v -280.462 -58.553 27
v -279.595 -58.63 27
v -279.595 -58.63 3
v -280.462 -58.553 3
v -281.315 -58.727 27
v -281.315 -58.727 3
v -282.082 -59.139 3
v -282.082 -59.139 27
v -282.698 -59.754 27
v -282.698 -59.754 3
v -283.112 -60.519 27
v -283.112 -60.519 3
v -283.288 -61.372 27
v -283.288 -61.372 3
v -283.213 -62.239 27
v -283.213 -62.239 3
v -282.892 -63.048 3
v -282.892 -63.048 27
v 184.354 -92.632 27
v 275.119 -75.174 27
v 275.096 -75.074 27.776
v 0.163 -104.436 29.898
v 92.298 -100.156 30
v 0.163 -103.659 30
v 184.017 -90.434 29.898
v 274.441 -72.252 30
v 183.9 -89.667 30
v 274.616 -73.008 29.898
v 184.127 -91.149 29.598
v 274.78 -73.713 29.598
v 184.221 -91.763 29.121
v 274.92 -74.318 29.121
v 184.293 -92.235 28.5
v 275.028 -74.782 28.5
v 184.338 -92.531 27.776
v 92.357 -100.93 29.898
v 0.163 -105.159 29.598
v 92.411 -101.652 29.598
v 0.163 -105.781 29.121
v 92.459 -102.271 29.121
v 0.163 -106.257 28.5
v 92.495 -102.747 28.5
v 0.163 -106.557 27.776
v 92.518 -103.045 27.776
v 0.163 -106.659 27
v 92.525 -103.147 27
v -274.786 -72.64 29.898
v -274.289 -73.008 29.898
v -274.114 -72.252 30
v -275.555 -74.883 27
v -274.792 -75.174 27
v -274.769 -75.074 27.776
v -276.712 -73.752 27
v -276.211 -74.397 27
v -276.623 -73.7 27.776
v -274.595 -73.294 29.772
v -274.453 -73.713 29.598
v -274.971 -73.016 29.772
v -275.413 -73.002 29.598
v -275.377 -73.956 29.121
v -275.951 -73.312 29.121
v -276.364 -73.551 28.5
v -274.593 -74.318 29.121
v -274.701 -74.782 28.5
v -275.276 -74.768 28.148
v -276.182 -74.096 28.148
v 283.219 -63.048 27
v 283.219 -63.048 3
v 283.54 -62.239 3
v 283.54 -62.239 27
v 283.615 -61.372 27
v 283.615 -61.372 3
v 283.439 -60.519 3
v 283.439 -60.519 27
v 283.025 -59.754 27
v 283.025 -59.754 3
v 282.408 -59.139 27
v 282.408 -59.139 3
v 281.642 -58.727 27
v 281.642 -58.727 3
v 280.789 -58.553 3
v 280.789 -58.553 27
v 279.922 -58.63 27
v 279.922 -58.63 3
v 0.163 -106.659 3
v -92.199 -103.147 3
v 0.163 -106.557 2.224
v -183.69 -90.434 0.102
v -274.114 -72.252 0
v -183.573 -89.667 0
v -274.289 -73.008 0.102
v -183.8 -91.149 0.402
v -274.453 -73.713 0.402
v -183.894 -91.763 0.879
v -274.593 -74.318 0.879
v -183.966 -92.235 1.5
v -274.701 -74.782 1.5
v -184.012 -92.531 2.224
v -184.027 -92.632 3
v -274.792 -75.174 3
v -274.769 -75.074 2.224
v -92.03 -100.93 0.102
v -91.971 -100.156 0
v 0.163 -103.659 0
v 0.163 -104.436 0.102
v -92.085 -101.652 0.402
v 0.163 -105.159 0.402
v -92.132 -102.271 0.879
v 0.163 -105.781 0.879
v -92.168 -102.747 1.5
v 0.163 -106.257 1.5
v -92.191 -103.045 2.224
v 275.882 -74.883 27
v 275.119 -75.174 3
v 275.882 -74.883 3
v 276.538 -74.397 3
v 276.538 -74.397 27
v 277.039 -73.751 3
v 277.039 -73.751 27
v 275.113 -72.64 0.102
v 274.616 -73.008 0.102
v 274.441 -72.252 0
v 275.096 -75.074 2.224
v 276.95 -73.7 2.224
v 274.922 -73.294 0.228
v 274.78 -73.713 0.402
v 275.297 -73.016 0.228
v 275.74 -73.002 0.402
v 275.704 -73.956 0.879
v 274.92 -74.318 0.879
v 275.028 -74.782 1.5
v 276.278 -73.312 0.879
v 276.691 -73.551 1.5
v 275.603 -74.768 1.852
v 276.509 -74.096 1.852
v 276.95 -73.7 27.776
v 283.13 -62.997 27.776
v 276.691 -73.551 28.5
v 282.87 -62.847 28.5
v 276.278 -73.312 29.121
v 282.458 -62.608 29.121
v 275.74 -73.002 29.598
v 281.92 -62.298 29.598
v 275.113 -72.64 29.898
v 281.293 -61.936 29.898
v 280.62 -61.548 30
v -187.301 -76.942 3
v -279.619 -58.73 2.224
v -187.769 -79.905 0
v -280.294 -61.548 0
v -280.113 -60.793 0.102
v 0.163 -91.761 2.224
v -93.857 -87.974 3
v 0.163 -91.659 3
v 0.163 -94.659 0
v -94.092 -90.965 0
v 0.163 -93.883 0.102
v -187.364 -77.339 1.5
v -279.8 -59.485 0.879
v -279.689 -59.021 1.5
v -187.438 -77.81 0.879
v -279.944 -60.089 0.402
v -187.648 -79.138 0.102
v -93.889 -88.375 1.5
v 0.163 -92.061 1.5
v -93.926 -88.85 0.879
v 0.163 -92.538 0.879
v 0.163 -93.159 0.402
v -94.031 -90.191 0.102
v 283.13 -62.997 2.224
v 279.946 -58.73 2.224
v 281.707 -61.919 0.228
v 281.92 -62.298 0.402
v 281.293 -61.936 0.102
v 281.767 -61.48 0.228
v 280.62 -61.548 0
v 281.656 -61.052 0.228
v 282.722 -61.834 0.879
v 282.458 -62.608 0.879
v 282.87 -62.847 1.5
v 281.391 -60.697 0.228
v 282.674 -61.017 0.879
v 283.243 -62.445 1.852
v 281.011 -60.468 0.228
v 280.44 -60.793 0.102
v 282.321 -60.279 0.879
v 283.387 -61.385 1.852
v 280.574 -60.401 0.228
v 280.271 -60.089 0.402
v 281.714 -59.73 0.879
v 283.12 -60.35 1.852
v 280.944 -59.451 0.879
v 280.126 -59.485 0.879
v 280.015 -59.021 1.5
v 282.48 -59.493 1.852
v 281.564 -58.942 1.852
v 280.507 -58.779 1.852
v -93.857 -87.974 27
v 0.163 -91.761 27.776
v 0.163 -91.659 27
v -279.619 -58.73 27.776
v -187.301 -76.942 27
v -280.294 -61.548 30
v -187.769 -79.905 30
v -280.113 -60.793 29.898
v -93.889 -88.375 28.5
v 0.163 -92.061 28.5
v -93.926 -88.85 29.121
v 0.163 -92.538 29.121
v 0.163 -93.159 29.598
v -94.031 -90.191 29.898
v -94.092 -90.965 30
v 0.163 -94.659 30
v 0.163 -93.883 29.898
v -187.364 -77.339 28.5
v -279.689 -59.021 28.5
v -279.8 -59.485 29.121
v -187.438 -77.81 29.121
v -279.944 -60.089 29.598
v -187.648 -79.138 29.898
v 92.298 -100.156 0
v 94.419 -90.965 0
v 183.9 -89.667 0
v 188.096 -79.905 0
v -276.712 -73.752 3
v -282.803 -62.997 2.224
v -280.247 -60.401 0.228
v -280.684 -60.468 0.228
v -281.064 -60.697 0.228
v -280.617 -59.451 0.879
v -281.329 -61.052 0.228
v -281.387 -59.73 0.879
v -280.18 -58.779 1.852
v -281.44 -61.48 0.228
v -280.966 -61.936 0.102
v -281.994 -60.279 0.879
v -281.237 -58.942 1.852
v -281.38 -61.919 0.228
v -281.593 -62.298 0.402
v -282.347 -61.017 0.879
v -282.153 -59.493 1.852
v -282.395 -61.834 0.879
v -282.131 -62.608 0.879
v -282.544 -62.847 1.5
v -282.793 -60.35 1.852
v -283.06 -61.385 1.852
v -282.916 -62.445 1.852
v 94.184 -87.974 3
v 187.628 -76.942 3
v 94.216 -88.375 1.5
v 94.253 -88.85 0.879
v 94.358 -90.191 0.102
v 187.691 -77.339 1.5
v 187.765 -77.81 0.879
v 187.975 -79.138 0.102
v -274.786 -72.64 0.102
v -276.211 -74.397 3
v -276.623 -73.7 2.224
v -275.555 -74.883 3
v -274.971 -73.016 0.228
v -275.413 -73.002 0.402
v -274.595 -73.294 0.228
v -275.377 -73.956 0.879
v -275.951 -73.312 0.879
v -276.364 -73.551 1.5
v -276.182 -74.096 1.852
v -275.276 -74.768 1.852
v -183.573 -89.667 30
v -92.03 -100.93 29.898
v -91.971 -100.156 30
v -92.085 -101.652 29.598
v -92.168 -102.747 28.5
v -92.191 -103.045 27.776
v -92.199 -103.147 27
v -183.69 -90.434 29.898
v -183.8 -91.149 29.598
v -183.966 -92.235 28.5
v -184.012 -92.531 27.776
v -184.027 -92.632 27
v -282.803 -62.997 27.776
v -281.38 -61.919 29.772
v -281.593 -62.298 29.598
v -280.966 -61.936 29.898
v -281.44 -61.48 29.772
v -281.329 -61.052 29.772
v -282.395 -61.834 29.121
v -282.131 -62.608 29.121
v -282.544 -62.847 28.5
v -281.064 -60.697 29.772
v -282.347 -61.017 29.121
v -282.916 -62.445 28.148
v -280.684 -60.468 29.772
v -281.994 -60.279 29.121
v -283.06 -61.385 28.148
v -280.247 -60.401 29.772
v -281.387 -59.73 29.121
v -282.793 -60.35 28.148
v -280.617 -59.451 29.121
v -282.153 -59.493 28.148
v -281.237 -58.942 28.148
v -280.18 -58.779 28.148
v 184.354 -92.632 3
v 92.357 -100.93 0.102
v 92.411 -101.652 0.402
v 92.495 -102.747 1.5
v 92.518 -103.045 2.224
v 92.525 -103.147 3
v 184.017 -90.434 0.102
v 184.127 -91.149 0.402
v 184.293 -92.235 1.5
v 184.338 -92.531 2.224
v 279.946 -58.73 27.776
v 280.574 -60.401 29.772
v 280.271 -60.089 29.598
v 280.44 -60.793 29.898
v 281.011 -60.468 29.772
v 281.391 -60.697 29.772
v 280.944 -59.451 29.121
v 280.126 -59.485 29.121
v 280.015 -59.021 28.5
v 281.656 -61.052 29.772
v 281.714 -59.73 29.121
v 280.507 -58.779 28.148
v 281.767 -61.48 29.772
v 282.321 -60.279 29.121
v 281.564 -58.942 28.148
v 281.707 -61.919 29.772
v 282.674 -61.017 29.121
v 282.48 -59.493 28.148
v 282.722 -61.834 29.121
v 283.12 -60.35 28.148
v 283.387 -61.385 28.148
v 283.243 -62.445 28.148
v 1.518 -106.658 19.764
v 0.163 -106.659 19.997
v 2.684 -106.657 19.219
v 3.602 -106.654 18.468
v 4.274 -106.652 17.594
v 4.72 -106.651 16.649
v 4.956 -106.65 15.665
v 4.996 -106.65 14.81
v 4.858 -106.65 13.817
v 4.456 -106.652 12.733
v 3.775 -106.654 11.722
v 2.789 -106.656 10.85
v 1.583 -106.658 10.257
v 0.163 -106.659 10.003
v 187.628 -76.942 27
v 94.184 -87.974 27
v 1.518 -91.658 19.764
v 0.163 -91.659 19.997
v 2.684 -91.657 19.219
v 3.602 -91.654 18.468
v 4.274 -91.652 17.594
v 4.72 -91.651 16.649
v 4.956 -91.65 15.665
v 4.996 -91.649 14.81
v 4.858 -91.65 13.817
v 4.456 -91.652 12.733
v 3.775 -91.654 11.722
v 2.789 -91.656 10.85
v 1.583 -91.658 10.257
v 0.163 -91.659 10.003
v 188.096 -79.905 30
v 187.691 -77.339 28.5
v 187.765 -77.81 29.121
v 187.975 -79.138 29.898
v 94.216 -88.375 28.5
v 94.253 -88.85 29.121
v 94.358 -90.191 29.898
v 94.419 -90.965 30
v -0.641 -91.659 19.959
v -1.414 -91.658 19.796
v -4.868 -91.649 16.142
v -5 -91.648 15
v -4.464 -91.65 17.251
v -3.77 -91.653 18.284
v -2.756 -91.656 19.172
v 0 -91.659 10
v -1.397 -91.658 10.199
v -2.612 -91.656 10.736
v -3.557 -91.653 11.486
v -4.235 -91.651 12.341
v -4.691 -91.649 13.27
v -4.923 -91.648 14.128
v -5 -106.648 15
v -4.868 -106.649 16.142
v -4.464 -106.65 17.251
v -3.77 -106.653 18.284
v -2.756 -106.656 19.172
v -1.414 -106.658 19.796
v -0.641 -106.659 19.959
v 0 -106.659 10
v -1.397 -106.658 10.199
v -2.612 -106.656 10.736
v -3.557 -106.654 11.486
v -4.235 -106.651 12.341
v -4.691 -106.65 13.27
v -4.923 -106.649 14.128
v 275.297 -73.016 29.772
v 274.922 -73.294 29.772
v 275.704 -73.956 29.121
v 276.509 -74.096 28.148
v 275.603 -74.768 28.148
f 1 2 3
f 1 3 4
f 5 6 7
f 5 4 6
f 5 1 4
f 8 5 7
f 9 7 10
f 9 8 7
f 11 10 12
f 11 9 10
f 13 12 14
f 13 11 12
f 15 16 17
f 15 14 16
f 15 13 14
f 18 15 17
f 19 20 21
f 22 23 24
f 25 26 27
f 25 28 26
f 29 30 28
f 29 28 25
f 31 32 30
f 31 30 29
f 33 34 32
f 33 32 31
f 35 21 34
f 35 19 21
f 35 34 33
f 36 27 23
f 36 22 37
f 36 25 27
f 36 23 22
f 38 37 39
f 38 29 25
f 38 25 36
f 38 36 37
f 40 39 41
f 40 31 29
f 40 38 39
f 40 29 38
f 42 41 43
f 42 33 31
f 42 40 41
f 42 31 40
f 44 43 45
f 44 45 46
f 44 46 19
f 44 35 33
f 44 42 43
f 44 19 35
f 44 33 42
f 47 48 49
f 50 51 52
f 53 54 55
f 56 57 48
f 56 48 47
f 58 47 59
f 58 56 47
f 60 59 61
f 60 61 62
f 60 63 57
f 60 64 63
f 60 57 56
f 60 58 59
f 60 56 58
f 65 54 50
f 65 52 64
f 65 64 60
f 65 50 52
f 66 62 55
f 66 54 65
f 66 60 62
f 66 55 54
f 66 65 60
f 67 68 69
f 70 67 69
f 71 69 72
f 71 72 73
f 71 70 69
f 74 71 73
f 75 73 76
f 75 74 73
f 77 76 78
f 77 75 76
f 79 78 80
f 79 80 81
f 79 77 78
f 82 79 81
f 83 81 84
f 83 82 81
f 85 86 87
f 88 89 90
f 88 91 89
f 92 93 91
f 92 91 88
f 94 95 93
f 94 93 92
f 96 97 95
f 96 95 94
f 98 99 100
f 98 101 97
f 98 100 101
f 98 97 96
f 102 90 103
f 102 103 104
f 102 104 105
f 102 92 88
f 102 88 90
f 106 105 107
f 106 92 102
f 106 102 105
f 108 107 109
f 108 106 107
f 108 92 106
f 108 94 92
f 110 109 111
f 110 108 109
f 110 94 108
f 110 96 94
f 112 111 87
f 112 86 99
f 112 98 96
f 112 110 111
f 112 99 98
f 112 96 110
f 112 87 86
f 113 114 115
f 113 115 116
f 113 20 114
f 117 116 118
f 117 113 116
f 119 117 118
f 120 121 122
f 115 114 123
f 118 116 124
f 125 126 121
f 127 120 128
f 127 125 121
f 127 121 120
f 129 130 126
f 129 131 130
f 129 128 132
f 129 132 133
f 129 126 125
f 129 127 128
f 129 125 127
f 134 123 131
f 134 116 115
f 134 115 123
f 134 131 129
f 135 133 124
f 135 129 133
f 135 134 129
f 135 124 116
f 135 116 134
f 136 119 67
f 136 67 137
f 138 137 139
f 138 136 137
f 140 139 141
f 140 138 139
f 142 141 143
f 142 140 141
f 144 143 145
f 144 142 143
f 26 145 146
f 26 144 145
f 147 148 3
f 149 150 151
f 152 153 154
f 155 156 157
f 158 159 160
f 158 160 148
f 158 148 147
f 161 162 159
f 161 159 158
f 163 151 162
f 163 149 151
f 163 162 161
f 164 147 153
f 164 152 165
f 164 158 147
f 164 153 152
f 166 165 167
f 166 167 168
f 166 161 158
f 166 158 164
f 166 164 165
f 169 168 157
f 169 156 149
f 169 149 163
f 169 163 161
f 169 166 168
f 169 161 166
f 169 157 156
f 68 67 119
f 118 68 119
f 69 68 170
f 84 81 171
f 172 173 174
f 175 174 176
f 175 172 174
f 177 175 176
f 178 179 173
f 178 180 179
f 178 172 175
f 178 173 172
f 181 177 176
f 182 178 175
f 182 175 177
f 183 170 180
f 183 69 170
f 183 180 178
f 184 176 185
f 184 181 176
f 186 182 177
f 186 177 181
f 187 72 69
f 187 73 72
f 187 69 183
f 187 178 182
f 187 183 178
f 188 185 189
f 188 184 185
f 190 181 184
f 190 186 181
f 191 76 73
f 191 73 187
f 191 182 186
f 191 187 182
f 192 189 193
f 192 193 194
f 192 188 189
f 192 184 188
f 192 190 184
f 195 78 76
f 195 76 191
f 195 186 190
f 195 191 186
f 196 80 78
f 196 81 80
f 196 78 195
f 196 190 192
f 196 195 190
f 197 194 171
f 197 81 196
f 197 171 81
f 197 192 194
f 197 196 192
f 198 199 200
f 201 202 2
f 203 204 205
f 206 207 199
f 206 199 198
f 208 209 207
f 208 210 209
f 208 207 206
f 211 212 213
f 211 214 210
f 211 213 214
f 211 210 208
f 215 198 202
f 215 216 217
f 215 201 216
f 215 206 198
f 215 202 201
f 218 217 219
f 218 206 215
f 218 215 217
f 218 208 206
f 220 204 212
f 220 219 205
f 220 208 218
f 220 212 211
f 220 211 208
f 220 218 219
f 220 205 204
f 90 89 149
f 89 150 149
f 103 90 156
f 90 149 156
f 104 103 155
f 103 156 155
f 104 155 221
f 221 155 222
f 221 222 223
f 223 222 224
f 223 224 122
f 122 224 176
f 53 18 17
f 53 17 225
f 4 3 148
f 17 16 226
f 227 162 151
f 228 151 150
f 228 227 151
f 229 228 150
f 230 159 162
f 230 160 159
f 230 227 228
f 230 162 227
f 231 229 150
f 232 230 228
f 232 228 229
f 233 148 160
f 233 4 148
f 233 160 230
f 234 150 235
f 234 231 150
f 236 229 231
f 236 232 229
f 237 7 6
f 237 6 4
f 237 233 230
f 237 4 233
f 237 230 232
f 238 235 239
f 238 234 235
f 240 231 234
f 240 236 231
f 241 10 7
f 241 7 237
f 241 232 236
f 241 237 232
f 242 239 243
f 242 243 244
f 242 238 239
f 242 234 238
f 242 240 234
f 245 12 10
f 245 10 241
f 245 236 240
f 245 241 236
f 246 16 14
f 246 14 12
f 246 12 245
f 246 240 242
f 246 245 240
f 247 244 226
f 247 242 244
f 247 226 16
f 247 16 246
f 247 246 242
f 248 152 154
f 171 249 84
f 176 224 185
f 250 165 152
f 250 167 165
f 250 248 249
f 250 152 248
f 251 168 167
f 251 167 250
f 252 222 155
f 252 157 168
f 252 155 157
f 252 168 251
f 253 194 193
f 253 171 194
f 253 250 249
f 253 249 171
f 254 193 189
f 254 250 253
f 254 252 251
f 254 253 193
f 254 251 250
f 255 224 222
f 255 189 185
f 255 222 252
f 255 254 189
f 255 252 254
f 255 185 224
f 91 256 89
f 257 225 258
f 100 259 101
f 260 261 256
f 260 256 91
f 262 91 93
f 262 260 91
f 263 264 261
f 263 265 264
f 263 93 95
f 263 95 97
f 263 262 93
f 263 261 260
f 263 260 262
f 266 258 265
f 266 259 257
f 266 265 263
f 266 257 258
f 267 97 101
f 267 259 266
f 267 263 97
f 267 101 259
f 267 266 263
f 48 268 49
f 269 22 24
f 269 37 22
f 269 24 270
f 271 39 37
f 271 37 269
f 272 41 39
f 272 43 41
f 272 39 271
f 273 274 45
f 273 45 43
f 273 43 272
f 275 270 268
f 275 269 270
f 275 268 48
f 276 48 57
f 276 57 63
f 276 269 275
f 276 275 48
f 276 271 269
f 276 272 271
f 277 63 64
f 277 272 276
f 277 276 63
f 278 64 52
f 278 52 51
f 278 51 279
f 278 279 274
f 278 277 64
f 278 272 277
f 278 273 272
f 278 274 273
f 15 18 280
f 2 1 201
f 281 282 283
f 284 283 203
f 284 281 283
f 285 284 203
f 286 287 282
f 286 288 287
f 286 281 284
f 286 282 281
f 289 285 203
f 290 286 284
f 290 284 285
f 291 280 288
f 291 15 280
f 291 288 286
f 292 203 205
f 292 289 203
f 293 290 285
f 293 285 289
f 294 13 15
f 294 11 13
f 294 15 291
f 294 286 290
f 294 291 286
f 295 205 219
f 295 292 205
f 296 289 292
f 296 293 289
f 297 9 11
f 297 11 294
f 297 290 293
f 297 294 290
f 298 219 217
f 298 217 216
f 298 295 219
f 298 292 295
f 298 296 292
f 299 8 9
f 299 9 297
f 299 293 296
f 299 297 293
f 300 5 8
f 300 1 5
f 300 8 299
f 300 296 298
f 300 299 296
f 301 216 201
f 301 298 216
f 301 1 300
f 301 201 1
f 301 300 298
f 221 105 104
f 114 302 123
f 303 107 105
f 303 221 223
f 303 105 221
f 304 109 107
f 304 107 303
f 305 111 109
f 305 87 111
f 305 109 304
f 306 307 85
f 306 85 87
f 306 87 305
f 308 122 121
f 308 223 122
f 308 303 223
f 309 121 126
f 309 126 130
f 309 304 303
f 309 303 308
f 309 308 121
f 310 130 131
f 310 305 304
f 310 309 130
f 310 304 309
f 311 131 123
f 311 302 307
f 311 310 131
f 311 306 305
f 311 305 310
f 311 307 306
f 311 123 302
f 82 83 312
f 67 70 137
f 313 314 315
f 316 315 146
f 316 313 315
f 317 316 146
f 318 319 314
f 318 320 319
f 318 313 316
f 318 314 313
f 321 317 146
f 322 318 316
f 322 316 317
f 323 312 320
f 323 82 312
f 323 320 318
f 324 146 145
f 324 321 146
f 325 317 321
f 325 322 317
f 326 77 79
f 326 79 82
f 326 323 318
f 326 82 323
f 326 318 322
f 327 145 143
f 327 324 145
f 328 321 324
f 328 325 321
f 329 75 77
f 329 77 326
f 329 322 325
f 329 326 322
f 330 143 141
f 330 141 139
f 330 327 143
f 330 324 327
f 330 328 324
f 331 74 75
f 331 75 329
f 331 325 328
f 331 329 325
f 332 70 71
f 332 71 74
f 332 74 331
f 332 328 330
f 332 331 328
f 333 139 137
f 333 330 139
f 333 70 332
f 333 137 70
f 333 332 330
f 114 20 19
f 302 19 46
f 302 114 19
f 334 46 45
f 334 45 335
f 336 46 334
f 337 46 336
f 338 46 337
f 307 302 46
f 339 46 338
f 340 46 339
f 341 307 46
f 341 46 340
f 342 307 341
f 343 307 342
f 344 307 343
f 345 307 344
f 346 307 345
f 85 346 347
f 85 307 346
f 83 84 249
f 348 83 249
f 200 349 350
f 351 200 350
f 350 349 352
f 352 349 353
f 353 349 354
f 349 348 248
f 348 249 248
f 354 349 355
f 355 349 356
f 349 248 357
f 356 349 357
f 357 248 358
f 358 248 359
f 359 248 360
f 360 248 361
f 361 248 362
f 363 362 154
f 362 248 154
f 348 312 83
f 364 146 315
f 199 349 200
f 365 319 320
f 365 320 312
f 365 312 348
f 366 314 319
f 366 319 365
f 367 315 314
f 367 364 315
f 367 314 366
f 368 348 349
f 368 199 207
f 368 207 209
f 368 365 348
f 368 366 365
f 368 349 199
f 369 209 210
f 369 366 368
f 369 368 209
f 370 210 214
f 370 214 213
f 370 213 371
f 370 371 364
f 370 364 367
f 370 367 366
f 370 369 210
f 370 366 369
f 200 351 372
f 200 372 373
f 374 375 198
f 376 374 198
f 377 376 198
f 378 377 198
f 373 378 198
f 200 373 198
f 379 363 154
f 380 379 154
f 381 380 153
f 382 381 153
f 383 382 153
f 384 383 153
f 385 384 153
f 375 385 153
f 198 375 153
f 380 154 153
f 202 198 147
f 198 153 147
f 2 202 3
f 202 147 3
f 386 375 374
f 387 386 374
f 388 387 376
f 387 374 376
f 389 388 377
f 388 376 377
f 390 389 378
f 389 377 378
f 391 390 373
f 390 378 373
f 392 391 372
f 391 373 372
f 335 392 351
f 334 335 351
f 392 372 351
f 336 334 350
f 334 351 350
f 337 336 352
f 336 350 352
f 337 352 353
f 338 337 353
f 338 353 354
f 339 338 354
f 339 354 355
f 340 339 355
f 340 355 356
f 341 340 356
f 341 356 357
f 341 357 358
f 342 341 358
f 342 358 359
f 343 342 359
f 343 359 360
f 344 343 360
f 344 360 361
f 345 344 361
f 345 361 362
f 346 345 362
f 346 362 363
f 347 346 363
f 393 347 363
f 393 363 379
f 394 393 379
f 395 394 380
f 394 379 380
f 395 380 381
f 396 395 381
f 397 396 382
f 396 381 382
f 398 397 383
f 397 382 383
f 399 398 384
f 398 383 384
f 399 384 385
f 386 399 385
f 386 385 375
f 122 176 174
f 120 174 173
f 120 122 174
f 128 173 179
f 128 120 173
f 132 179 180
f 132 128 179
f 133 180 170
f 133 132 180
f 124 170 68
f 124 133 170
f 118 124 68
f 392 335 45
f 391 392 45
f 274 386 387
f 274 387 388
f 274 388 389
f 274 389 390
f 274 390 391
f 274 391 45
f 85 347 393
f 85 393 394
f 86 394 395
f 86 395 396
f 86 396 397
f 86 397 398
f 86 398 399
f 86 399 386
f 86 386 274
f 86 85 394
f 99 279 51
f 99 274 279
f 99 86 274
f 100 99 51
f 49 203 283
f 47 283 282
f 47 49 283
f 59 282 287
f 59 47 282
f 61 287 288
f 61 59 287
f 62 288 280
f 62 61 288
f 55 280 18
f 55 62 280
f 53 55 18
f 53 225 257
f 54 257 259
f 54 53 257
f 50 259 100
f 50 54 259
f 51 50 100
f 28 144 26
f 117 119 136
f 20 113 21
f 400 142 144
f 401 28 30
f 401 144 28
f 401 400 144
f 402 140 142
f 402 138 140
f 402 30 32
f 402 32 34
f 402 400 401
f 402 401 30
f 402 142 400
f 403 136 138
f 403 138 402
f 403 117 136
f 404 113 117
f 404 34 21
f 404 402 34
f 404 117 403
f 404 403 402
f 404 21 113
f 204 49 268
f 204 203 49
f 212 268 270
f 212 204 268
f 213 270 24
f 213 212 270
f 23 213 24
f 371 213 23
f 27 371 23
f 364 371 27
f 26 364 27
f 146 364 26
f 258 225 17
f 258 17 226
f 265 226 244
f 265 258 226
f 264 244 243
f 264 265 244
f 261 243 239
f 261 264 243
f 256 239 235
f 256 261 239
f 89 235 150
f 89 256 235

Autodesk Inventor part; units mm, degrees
ref_plane "YZ Plane" through (0, 0, 0) normal (1, 0, 0) x (0, 1, 0)
ref_plane "XZ Plane" through (0, 0, 0) normal (0, 1, 0) x (-1, 0, 0)
ref_plane "XY Plane" through (0, 0, 0) normal (0, 0, 1) x (1, 0, 0)
sketch "Sketch1" plane through (0, 0, 0) normal (0, 0, 1) x (1, 0, 0)
  arc A0 (0.1634, -91.6592) -> (286.7211, -56.9812) centre (0.1634, 1109.6463) ccw
  arc A1 (0.1634, -106.6592) -> (276.3881, -74.8786) centre (0.1634, 1109.6463) ccw
  line L0 (286.7211, -56.9812) -> (276.3881, -74.8786)
  line L1 (286.7211, -56.9812) -> (307.3872, -56.9812) construction
  line L2 (0.1634, -106.6592) -> (0.1634, -82.9582)
  arc A2 (-286.3942, -56.9812) -> (0.1634, -91.6592) centre (0.1634, 1109.6463) ccw
  arc A3 (-276.0612, -74.8786) -> (0.1634, -106.6592) centre (0.1634, 1109.6463) ccw
  line L3 (-286.3942, -56.9812) -> (-276.0612, -74.8786)
  point P0 (0, 0)
  point P1 (254.828, -79.7002)
  dimension "d0" = 15
  dimension "d1" = 120
extrude "Extrusion1" add sketch "Sketch1" along normal blind 30
fillet "Fillet1" radius 3 12 edges at (-144.1607, -82.9582, 30) (139.1869, -98.6879, 30) (144.4876, -82.9582, 0) (286.7211, -56.9812, 15) (281.5546, -65.9299, 0) (281.5546, -65.9299, 30) (276.3881, -74.8786, 15) (139.1869, -98.6879, 0) (-286.3942, -56.9812, 15) (-281.2277, -65.9299, 30) (-276.0612, -74.8786, 15) (-281.2277, -65.9299, 0)
sketch "Sketch2" plane through (0, 0, 0) normal (0, 1, 0) x (-1, 0, 0)
  line L0 (0, 0) -> (0, 15)
  circle A0 centre (0, 15) radius 5
  dimension "d5" = 15
  dimension "d6" = 10
extrude "Extrusion2" cut sketch "Sketch2" against normal blind 300
properties part number "leaf 3" material "Steel, Carbon"
